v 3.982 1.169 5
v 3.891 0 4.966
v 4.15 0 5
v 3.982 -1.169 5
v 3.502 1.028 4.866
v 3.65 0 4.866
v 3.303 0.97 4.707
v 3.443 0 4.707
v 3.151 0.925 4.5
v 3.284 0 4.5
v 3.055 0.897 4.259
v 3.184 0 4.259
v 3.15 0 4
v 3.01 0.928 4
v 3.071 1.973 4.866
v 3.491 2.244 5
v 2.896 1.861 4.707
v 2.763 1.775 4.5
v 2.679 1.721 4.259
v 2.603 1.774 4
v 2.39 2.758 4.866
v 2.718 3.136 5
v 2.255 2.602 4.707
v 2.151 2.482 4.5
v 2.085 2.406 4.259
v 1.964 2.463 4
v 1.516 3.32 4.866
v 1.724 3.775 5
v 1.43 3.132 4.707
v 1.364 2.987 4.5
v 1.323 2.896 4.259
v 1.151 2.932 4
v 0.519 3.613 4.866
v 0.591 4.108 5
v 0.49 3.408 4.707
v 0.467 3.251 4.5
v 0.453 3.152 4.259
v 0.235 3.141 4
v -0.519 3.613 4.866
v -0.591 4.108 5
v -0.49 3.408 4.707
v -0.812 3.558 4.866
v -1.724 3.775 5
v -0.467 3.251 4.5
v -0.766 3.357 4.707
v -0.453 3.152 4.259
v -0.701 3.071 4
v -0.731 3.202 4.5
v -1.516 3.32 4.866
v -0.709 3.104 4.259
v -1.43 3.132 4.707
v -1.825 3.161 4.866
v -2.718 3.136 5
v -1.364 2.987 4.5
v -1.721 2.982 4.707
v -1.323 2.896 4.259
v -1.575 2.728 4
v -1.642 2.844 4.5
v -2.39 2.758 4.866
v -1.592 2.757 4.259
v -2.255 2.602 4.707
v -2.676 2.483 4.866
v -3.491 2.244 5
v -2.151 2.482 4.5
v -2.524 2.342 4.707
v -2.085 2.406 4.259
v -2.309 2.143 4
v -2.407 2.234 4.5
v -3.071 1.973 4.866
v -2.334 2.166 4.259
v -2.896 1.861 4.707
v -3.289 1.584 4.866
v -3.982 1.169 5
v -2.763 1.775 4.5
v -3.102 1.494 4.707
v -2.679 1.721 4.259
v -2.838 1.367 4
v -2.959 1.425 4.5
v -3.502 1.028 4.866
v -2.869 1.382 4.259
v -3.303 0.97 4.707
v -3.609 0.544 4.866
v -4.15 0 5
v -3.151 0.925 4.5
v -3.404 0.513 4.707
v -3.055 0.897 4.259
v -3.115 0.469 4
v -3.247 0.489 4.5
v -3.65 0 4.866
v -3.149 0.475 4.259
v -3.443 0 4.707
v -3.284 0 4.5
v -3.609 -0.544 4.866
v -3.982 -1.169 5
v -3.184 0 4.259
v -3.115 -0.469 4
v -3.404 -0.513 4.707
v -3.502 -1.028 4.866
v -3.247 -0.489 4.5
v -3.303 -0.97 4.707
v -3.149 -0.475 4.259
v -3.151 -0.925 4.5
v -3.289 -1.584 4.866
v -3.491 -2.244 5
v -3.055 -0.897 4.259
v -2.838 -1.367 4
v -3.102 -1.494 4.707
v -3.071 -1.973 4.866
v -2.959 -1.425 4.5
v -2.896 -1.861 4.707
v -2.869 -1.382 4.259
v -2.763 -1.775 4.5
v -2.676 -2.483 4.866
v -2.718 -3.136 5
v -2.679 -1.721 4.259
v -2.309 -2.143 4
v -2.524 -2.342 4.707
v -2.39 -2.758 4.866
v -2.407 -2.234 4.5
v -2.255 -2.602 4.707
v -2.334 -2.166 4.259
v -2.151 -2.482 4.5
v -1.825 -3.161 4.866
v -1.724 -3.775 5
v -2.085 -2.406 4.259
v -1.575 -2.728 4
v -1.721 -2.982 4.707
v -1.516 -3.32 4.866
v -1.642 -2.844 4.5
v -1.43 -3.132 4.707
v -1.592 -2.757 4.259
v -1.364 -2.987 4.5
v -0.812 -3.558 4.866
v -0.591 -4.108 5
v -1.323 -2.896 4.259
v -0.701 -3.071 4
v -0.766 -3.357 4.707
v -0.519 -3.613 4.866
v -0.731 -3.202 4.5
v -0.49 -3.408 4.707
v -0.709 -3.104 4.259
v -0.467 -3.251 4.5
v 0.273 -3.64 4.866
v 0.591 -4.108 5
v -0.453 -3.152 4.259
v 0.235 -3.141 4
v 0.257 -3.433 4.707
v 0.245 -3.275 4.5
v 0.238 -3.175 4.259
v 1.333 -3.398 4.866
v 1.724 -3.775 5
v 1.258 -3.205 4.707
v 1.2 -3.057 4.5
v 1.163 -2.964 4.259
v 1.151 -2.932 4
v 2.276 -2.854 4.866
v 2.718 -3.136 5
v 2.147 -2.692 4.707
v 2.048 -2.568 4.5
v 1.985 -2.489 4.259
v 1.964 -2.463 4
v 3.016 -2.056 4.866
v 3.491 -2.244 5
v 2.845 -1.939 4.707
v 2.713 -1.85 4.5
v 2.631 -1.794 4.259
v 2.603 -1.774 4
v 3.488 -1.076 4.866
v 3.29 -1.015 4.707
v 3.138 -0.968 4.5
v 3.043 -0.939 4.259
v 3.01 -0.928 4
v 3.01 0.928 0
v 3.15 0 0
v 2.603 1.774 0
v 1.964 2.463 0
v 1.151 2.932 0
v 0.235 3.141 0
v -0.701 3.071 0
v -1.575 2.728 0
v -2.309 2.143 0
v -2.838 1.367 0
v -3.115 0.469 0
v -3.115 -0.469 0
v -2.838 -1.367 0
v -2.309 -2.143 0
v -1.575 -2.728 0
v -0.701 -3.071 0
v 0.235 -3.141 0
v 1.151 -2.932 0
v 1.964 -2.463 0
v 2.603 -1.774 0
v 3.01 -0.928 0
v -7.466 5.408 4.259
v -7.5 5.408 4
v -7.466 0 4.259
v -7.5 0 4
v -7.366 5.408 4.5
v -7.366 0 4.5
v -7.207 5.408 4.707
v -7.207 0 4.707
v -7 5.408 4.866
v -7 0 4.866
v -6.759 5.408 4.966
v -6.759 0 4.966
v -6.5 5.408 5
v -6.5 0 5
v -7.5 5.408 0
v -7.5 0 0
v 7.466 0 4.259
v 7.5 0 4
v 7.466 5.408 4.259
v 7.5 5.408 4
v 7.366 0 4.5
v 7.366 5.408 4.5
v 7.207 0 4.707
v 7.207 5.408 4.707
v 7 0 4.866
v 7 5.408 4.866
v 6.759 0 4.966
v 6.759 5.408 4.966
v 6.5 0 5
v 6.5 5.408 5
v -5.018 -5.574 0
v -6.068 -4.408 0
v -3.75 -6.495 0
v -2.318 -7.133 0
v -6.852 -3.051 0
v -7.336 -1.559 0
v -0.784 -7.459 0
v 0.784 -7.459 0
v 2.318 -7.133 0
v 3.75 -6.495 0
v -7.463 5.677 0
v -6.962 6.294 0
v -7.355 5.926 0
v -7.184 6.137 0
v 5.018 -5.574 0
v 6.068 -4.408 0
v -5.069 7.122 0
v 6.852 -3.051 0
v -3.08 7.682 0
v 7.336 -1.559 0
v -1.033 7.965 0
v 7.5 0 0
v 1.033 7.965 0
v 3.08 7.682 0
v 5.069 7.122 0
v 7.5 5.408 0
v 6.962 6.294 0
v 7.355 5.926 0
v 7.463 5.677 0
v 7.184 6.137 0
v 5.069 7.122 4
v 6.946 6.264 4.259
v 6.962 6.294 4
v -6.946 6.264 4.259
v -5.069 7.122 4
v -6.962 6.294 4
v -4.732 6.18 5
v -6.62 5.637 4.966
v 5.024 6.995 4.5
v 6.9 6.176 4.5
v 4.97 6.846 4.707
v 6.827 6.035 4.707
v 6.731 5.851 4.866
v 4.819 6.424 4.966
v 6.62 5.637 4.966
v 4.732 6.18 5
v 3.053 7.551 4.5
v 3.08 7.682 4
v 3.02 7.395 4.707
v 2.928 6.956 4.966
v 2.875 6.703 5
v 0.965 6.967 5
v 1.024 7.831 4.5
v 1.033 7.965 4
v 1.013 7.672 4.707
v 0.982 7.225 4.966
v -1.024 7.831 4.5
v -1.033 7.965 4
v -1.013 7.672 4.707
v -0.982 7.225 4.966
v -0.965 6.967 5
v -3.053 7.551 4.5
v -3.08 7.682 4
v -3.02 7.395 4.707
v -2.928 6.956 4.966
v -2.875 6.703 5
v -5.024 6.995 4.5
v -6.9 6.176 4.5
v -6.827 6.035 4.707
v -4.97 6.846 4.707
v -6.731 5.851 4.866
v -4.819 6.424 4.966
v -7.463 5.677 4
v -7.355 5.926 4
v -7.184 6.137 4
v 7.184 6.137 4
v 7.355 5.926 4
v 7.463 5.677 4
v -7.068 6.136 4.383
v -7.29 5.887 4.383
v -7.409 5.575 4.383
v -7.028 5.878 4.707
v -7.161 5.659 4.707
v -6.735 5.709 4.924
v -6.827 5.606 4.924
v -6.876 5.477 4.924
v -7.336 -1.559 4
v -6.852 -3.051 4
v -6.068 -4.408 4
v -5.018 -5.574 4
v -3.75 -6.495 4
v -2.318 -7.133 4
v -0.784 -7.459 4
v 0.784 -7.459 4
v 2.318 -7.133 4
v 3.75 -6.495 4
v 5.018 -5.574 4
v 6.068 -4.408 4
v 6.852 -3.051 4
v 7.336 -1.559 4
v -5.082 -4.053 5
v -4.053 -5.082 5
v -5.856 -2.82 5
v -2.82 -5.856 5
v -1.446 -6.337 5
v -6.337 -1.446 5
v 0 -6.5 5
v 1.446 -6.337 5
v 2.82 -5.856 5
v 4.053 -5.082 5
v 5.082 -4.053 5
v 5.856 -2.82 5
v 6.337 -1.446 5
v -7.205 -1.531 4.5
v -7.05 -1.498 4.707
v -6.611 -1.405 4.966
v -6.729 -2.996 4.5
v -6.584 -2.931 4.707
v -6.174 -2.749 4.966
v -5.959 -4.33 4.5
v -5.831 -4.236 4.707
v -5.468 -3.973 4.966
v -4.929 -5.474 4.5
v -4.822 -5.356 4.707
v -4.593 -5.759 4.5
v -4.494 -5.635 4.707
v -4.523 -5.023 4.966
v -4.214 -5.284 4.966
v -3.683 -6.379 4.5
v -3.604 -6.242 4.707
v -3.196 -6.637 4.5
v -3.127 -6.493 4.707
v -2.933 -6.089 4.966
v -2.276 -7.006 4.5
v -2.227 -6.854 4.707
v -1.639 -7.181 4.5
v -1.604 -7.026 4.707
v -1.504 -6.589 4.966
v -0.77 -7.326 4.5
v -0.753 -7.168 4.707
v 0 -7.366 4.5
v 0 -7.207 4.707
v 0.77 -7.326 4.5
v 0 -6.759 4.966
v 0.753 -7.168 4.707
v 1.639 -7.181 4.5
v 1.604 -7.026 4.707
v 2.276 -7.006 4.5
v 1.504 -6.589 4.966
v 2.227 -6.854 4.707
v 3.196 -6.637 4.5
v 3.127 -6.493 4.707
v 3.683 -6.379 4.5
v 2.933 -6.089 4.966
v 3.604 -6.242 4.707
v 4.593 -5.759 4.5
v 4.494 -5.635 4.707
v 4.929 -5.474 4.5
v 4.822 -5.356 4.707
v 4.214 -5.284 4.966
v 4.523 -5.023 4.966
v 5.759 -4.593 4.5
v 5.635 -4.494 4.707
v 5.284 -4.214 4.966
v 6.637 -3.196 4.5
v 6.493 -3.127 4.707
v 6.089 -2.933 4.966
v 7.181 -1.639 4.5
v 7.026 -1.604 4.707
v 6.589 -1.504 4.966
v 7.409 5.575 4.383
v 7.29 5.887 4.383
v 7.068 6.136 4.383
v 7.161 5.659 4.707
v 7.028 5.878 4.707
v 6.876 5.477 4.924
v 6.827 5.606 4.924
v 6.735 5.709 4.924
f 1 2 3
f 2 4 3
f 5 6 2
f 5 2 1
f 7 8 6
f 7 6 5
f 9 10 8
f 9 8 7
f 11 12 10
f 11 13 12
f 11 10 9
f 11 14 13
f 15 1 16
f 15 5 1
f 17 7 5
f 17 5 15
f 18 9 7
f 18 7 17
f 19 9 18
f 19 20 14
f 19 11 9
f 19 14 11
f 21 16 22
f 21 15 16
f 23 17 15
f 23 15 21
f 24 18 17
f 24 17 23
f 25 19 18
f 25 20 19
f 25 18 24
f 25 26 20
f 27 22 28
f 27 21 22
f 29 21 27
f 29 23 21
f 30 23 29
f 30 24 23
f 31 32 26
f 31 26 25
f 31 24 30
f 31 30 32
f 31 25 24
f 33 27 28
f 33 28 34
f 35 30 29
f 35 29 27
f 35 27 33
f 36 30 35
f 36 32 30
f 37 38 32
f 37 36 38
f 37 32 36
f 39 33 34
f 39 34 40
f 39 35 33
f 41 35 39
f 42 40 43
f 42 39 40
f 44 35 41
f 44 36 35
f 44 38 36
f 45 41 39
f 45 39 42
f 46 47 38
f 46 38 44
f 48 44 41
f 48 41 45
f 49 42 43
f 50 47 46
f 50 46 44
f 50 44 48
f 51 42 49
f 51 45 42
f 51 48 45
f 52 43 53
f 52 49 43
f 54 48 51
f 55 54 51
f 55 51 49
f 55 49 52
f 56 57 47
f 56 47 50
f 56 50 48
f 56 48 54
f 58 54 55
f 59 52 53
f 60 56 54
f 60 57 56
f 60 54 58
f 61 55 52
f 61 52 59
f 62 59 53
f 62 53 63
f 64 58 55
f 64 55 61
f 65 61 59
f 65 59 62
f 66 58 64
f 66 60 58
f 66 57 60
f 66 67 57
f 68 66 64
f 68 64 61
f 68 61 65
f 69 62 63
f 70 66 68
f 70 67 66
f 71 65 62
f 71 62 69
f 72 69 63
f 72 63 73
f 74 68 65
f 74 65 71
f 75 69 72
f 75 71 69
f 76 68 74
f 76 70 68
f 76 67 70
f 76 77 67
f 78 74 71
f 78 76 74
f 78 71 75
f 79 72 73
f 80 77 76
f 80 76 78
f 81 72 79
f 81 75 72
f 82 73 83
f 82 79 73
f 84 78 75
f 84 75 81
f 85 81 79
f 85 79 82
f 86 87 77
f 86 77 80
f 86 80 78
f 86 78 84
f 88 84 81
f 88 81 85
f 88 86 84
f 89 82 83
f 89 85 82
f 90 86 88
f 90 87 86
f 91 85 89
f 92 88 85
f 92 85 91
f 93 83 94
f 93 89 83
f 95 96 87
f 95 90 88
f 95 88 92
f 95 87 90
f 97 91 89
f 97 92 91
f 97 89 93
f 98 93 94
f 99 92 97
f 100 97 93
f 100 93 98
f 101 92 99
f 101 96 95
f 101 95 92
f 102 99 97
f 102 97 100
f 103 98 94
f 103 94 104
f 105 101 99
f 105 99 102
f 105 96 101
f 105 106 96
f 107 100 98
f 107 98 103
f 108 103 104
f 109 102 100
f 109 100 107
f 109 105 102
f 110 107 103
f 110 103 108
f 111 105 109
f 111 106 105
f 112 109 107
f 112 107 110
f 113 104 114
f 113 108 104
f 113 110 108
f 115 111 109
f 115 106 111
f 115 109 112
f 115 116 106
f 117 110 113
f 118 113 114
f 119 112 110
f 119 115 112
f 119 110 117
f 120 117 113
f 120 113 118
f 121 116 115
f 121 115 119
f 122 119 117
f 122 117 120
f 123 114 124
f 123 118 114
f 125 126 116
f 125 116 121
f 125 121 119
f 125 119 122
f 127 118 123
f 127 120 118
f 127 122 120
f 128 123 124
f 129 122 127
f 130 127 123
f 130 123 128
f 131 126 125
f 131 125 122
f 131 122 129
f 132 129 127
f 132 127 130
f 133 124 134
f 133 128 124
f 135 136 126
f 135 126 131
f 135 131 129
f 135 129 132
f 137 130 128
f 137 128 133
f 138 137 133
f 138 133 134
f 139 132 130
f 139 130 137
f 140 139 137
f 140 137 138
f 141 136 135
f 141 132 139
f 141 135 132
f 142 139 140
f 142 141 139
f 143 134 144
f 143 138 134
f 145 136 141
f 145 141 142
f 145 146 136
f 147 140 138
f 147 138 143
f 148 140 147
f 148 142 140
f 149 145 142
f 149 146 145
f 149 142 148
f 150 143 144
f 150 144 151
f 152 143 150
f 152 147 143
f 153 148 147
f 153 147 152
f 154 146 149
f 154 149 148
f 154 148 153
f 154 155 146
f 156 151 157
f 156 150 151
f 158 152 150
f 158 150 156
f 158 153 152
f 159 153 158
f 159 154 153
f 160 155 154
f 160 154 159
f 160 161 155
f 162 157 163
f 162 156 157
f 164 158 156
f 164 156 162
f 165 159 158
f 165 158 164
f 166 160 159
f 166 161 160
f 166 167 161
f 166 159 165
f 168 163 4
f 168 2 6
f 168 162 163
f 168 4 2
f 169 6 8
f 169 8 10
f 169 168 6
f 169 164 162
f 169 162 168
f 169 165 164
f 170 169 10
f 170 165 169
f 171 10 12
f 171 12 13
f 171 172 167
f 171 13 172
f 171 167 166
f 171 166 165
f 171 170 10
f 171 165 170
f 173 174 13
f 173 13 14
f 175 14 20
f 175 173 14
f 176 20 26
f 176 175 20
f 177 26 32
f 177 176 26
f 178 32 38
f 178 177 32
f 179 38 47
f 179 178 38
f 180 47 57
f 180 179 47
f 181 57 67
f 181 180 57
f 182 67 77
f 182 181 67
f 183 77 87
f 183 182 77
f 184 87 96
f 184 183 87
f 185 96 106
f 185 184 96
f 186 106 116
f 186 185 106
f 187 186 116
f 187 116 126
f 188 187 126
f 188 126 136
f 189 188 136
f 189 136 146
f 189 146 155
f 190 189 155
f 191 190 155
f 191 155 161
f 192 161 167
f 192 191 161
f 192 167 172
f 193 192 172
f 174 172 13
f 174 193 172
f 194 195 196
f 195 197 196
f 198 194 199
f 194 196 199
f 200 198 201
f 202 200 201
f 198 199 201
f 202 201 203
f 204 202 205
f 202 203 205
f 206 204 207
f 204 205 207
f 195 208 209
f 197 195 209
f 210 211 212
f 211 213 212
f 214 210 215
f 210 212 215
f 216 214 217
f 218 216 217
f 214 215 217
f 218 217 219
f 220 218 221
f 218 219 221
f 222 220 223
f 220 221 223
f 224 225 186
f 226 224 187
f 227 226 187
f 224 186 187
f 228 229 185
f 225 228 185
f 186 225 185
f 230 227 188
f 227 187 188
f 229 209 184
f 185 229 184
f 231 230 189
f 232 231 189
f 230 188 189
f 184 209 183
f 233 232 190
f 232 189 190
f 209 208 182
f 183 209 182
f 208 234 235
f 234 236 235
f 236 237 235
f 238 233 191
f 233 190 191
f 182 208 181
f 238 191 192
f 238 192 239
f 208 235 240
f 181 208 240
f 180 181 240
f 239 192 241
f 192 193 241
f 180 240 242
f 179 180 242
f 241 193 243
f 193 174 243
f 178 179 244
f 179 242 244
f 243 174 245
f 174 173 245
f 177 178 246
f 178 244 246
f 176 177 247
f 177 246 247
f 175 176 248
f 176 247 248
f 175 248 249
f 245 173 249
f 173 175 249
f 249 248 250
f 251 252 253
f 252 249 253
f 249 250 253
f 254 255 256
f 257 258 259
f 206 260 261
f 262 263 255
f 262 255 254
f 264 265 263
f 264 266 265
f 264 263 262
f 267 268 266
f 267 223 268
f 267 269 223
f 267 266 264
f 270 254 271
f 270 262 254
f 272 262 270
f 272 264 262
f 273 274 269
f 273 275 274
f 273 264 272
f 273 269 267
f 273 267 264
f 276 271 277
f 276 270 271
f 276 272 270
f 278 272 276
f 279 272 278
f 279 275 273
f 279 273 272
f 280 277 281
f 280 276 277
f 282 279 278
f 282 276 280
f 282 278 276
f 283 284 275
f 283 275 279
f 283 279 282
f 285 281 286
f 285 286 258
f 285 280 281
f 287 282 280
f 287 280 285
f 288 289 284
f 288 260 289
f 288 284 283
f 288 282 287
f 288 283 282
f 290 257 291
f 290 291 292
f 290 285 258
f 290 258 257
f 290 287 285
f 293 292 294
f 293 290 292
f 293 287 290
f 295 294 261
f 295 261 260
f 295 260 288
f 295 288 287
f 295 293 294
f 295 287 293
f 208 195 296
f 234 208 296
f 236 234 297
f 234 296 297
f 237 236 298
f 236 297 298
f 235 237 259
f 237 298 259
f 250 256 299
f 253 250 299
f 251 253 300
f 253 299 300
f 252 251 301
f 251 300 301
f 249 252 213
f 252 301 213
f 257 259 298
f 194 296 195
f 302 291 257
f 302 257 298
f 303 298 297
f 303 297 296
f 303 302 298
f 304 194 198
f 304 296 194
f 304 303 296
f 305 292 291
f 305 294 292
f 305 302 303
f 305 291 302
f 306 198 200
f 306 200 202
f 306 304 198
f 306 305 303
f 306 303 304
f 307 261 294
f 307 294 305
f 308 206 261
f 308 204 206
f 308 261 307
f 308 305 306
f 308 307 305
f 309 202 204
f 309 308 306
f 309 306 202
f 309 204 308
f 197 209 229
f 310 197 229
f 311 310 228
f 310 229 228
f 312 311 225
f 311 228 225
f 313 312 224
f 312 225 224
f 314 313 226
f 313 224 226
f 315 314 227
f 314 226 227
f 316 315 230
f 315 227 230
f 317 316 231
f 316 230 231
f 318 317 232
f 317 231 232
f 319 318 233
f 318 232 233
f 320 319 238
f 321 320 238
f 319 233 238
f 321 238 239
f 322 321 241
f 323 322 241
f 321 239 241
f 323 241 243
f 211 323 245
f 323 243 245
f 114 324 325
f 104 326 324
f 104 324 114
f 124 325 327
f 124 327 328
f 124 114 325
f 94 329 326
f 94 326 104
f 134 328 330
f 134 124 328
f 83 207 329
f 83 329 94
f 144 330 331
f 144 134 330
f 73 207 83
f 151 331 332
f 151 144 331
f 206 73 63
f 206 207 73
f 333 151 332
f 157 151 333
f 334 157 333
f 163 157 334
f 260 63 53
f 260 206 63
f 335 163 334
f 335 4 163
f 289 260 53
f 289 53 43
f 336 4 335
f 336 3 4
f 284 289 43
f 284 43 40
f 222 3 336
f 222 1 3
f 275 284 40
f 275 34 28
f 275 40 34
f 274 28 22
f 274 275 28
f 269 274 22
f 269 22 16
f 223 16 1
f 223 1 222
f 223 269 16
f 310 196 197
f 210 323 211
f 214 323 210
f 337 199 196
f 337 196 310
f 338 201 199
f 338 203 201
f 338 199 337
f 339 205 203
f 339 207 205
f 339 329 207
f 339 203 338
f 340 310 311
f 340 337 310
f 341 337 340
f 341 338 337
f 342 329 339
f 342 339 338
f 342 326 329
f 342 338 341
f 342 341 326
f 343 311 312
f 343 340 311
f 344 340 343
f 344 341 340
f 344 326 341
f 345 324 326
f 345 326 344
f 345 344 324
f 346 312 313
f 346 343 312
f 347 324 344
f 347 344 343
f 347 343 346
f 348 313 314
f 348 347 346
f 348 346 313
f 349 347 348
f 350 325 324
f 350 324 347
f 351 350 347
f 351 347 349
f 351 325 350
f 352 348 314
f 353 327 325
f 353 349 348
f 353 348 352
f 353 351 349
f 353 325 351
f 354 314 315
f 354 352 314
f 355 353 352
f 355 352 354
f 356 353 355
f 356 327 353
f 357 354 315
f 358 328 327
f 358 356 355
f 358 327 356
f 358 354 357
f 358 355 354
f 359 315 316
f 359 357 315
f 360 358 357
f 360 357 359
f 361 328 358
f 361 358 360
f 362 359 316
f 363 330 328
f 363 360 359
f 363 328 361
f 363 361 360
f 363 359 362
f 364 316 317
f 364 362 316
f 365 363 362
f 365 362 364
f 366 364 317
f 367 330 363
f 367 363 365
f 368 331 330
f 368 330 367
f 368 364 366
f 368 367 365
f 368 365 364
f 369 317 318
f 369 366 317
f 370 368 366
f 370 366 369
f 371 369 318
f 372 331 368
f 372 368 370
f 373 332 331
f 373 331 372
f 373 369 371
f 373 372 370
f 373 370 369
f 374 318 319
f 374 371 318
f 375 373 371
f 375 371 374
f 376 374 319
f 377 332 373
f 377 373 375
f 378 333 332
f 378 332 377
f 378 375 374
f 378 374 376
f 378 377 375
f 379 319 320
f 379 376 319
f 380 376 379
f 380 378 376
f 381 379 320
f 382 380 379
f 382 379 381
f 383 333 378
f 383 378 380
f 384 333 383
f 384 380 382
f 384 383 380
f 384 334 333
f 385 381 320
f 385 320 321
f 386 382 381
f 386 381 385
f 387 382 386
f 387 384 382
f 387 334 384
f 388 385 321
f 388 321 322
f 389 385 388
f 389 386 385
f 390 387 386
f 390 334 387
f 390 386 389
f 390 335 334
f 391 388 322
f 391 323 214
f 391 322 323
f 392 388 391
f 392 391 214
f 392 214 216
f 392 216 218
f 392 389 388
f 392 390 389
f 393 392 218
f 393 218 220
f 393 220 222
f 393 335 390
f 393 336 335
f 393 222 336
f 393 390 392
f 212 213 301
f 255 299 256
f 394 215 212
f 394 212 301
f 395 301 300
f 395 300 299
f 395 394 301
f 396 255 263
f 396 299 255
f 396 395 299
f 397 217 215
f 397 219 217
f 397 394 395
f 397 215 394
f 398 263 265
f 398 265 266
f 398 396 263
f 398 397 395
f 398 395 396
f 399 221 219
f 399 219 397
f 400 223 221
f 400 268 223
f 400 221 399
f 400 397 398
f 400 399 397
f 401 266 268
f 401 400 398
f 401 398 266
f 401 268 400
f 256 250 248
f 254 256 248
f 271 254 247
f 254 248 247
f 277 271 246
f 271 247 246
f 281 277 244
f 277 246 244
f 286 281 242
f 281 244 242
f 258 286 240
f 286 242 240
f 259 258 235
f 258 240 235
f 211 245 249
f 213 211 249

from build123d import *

# Parameters (mm, degrees)
F0_R     = 3.15
F1_DEPTH = 5
F2_R     = 1
F3_R     = 1


with BuildPart() as f1:
    # F0 (on Top) → F1 (new body)
    with BuildSketch(Plane.XY):
        with BuildLine():
            Line((-7.5, 6), (-7.5, 0))
            ThreePointArc((-7.5, 0), (0, -7.5), (7.5, 0))
            Line((7.5, 0), (7.5, 6))
            ThreePointArc((7.5, 6), (0, 8), (-7.5, 6))
        make_face()
        Circle(F0_R, mode=Mode.SUBTRACT)
    extrude(amount=F1_DEPTH)

    # F2
    f2_edges = [f1.edges().sort_by_distance(p)[0] for p in [
        (-7.5, 6, 2.5),
        (7.5, 6, 2.5),
    ]]
    fillet(f2_edges, radius=F2_R)

    # F3
    f3_edges = [f1.edges().sort_by_distance(p)[0] for p in [
        (-7.5, 2.70381, 5),
        (-3.15, 0, 5),
    ]]
    fillet(f3_edges, radius=F3_R)


solid = f1.part
